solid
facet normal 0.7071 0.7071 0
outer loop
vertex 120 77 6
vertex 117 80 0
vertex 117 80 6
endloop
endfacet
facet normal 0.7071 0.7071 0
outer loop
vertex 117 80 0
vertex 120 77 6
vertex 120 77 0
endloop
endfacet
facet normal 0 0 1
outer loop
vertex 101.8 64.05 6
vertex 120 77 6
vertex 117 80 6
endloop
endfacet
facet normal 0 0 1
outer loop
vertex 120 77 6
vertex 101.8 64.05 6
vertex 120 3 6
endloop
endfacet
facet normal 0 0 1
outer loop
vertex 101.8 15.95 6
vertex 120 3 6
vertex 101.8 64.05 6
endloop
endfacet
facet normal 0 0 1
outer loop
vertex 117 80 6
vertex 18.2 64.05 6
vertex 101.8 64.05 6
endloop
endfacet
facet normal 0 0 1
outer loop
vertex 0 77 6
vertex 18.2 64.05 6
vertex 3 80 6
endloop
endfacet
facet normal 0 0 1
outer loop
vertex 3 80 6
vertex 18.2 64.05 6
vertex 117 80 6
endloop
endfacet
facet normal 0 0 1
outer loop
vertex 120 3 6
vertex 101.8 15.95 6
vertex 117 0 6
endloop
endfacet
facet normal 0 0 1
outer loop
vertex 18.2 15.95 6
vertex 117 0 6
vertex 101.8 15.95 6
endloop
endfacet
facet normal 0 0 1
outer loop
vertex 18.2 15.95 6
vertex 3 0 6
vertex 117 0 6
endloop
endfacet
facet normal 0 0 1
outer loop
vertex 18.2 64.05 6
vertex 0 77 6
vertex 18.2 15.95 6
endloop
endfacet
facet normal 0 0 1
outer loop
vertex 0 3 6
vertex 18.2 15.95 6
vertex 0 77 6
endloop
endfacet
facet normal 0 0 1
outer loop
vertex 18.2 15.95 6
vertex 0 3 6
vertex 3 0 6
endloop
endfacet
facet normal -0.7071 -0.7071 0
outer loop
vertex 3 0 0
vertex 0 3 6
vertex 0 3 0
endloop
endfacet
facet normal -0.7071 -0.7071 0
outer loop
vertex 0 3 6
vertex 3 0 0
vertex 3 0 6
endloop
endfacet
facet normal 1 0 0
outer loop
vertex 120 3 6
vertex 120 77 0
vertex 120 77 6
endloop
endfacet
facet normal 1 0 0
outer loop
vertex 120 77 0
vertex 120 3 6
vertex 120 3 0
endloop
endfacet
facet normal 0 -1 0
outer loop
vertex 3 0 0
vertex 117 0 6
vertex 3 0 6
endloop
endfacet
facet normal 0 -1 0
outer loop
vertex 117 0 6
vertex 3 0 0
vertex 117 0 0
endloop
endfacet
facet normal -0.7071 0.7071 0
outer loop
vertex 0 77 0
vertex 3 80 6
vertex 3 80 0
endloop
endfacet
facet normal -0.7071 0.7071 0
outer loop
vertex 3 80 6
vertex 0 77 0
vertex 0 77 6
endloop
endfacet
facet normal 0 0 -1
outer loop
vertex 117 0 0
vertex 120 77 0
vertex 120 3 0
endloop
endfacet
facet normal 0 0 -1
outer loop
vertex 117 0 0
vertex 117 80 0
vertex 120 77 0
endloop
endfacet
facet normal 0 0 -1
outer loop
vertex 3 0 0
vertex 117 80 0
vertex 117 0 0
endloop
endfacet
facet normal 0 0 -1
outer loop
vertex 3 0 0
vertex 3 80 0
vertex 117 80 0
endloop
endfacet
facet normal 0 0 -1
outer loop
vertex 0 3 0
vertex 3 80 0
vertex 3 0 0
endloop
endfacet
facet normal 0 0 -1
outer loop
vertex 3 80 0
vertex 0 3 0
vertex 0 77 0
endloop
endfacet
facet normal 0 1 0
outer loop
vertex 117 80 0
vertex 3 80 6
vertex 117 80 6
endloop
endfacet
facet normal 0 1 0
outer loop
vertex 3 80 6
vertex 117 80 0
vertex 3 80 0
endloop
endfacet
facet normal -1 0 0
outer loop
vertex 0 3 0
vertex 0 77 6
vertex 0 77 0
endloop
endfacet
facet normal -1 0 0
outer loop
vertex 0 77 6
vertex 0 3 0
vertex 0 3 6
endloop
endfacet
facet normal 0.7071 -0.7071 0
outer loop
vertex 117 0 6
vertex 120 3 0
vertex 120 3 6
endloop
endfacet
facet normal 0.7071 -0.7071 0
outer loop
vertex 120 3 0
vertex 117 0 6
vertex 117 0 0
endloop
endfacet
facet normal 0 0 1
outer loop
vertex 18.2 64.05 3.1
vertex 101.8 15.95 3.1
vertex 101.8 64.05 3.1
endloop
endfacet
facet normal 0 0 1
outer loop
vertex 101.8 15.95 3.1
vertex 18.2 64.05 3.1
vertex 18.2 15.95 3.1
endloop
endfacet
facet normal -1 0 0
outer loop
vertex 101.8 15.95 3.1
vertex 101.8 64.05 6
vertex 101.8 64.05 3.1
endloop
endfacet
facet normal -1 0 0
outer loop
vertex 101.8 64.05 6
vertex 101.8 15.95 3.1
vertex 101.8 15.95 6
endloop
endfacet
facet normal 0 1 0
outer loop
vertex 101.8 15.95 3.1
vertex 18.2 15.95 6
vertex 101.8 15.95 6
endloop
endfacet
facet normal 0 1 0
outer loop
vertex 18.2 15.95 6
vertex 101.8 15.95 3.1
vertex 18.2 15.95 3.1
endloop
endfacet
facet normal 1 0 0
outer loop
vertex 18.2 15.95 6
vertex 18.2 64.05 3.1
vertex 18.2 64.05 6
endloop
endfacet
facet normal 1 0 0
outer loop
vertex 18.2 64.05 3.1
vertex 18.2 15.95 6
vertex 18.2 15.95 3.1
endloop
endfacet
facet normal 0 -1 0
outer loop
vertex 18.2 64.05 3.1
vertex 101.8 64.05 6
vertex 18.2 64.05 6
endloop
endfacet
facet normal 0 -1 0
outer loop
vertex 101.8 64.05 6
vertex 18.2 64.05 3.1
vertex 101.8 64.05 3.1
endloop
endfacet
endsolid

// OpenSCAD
$fn = 32;

// ----------------------------------------------------------------------
// Windowed plate: 1 voids, 120 x 80 x 6 mm
// ----------------------------------------------------------------------

// --- parameters (mm) ---
plate_l = 120;            // plate length, X
plate_w = 80;             // plate width, Y
plate_t = 6;              // plate thickness, Z
edge_margin = 12;         // wall from the plate edge to any window
win1_l = 83.6;            // window length
win1_w = 48.1;            // window width
depth_1 = 2.9;            // depth of void 1 (full thickness = through)
corner_c = 3;             // corner chamfer of the plate

profile = [[3, 0], [117, 0], [120, 3], [120, 77], [117, 80], [3, 80], [0, 77], [0, 3]];  // primary outline, 8 points, counter clockwise
void_1 = [[18.2, 15.95], [101.8, 15.95], [101.8, 64.05], [18.2, 64.05]];  // large central window, 4 points

// --- the one profile operation ---
difference() {
  linear_extrude(height = plate_t) polygon(points = profile);
  translate([0, 0, plate_t - depth_1])
    linear_extrude(height = depth_1 + 1) polygon(points = void_1);
}
